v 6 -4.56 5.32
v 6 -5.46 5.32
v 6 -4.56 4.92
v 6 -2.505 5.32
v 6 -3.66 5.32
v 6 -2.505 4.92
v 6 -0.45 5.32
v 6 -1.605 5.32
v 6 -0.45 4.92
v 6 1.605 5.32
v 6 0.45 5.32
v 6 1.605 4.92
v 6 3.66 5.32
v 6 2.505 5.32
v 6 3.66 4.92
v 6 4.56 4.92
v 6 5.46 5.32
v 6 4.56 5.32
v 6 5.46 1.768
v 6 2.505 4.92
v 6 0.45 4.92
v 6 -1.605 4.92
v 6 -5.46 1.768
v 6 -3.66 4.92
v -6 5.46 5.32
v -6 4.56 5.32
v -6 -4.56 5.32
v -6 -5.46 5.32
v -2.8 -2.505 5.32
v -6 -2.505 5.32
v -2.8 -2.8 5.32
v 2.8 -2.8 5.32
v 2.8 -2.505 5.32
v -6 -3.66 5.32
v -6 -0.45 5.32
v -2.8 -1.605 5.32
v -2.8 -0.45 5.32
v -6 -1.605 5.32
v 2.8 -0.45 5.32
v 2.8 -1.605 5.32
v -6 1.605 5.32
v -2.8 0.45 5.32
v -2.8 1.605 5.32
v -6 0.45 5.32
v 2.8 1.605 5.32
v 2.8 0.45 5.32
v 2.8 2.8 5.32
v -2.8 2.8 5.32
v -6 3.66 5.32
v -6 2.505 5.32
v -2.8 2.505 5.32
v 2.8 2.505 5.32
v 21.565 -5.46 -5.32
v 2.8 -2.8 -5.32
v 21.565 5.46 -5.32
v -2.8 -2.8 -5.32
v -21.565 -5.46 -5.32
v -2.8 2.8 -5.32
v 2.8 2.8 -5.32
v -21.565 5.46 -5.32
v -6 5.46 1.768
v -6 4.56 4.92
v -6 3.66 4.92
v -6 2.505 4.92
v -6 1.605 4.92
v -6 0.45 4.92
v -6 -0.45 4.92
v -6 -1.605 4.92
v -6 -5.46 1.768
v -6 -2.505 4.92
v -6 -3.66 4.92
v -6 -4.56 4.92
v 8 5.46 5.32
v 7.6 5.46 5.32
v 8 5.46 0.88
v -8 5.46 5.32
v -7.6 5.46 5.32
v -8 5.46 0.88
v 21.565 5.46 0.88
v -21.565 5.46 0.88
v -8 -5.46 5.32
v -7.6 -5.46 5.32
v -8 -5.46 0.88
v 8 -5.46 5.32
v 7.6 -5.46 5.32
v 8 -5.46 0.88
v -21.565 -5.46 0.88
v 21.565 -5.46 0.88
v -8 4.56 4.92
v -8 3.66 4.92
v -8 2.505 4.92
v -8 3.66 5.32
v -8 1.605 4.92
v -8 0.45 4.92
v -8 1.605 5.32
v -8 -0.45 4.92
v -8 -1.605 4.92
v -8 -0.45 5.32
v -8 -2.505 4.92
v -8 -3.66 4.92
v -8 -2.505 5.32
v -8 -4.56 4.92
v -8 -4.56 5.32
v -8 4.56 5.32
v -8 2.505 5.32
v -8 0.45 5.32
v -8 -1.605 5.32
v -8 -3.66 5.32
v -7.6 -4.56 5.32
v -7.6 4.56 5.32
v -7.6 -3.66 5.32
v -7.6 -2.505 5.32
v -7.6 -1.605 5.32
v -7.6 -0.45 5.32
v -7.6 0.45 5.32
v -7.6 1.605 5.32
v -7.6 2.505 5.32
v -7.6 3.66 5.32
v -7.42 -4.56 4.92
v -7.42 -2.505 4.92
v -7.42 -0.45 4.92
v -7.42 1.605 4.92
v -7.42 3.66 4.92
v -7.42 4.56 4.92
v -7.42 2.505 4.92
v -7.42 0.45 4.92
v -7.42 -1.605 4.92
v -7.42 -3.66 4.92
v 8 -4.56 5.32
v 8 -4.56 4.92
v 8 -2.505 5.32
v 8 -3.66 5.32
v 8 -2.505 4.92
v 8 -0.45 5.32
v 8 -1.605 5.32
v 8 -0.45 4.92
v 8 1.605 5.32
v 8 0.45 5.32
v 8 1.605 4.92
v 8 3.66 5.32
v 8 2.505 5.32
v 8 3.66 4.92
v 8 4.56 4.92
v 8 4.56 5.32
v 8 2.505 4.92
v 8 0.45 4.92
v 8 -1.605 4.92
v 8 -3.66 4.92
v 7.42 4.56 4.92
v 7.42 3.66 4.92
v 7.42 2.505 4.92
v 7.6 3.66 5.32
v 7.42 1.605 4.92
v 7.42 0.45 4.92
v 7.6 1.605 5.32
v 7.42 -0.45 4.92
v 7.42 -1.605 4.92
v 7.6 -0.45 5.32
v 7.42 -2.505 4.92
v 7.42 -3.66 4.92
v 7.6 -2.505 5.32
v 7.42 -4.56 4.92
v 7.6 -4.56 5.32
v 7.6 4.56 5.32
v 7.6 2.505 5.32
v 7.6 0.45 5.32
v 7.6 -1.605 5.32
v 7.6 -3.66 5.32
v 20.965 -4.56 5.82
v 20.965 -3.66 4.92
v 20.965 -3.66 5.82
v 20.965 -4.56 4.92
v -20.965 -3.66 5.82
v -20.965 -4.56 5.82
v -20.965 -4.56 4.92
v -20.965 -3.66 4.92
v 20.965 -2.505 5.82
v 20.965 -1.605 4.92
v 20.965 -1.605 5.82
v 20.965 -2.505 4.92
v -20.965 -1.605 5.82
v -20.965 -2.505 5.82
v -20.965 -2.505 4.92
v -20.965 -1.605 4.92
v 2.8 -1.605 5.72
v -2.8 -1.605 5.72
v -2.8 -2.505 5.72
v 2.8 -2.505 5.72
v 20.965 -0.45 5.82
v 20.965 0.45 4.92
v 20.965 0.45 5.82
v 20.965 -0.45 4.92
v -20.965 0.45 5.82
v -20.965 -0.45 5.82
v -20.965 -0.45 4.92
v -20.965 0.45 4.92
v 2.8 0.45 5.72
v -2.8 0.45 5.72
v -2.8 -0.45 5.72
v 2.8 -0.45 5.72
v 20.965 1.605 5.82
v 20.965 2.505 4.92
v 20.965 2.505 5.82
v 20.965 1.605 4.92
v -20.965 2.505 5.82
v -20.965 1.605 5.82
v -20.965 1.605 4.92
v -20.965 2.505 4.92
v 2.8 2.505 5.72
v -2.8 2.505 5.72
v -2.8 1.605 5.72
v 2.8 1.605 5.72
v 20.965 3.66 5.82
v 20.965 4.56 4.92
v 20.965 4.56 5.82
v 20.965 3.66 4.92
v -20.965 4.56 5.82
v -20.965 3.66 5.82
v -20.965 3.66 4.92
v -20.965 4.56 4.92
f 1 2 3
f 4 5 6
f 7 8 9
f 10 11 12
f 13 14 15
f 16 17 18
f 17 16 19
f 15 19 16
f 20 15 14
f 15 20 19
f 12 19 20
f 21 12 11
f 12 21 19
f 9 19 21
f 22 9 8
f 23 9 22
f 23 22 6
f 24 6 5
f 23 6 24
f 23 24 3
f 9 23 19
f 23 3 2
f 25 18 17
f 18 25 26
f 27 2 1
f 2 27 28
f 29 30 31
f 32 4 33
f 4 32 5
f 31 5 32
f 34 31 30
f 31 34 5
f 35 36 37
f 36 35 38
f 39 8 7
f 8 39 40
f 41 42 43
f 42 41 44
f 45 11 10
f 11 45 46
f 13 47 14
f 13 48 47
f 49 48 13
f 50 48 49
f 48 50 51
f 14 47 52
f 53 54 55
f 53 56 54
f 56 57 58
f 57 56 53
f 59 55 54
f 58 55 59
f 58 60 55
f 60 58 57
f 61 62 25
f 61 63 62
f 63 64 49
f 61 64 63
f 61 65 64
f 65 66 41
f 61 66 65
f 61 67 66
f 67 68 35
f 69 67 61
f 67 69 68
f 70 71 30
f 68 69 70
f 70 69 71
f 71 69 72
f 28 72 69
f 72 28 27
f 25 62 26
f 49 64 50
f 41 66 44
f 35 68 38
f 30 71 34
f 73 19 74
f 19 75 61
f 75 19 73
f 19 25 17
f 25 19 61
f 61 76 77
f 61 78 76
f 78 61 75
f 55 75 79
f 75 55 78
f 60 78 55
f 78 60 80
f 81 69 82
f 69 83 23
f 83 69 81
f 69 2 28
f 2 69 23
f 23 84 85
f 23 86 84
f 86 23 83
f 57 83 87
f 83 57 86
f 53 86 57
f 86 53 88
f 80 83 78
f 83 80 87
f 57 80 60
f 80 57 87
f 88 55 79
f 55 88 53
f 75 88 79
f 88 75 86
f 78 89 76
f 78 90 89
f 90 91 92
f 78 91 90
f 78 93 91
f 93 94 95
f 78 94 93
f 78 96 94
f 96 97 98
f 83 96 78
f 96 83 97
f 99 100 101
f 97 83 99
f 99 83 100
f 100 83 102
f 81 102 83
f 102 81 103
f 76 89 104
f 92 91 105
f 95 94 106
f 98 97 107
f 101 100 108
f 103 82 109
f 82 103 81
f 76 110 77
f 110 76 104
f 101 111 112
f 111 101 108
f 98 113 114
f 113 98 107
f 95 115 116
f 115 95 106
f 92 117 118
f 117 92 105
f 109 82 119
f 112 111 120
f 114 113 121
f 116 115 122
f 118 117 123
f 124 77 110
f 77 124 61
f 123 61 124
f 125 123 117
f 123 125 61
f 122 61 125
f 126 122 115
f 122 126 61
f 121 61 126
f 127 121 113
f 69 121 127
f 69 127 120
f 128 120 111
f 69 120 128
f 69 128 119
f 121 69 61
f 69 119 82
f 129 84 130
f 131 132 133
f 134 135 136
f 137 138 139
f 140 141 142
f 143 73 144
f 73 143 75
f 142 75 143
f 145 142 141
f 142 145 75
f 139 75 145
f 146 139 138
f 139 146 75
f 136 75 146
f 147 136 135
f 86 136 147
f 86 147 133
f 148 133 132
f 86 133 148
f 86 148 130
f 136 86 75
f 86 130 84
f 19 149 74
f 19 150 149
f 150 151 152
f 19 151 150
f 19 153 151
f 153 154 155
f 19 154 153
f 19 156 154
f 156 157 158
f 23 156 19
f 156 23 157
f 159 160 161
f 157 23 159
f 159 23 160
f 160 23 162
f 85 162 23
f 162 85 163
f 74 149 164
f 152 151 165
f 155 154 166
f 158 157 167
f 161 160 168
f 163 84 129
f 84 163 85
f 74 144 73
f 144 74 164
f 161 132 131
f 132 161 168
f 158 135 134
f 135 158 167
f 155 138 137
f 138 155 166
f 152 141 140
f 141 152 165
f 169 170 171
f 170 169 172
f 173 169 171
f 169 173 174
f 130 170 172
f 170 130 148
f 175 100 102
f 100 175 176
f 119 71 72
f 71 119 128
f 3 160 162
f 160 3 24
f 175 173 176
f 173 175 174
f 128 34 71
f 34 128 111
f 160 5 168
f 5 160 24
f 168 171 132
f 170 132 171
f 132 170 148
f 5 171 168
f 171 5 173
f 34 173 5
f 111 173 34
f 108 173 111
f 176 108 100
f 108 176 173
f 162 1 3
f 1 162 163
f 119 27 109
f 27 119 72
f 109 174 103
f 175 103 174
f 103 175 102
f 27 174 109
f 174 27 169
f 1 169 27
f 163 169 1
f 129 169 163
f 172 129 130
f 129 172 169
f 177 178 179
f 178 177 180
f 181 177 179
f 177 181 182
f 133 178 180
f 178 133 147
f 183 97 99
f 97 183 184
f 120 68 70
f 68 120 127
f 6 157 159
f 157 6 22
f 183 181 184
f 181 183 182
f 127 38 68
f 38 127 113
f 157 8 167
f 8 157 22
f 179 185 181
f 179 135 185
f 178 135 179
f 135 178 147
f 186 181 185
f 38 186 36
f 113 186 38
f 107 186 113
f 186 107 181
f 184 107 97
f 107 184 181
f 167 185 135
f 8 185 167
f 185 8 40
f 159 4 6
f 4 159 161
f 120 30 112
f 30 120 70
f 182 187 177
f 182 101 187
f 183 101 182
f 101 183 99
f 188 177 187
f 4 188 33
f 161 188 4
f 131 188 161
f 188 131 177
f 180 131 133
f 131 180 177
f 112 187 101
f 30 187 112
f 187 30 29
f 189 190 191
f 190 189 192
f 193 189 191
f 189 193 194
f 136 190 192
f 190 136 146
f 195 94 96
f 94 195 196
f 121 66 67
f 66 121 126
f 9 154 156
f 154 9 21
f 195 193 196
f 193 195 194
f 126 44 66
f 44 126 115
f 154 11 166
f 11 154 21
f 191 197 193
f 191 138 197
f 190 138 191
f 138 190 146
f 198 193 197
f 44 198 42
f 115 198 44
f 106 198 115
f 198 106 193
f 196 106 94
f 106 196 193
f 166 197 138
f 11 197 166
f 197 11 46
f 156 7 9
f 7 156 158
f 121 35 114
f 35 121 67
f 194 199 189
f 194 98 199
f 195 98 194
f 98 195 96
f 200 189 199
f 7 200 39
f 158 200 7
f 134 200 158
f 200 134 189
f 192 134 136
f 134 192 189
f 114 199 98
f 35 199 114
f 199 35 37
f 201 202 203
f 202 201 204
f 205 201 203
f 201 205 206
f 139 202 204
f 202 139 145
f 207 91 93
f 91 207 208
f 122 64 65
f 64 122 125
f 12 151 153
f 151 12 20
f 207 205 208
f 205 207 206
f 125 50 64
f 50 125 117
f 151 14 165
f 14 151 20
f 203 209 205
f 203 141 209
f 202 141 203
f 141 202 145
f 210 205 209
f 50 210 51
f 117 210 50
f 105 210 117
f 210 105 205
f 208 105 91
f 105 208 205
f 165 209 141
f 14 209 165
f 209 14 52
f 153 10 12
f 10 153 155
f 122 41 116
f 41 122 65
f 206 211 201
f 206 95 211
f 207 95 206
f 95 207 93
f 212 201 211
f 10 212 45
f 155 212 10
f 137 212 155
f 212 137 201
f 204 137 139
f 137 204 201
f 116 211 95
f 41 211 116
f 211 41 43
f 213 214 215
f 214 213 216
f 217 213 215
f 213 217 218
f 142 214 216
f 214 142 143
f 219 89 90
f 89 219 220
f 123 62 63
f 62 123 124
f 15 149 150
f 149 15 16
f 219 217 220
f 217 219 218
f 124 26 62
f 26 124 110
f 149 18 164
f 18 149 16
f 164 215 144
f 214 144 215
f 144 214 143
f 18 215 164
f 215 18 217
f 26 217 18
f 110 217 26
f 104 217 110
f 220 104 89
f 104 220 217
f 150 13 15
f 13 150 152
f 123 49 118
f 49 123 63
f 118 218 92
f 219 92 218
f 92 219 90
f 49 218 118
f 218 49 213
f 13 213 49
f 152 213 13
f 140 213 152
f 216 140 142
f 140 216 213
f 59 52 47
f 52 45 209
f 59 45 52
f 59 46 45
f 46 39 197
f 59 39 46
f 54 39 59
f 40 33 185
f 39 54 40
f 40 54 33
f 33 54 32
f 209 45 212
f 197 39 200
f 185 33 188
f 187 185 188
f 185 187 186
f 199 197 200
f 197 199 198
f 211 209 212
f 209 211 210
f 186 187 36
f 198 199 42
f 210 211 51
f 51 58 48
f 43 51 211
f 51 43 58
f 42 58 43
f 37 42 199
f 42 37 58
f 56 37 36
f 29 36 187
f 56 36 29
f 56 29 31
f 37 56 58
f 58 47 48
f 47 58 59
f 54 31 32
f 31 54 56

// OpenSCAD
// Symmetric elongated bracket/strap with central square through-window and longitudinal ribs
// Target bounding box: 10.9 x 43.9 x 10.6 mm (W x L x H), elongated along X

$fn = 64;

// Overall dimensions
L = 43.93;   // X
W = 10.92;   // Y
H = 10.64;   // Z

// Central block
center_L = 12.0;
center_W = W;
center_H = H;

// Arms (thinner)
arm_L_each = (L - center_L)/2;
arm_W = W;
arm_H = 6.2;

// Transition length (simple hull ramp)
transition_L = 2.0;

// Square through-window (through full height)
window_size = 5.6;

// Ribs: multiple longitudinal ribs on ONE face (top)
rib_count = 5;
rib_W = 0.9;     // rib width across Y
rib_H = 0.9;     // rib height in Z
rib_end_margin = 1.0;
rib_side_margin = 0.9;

// Small overlap to guarantee manifold unions/differences
overlap = 0.4;

// ----------------- Core solids -----------------
module central_block() {
    cube([center_L, center_W, center_H], center=true);
}

module arm(side=1) { // side = -1 left, +1 right
    // Place arm so it overlaps into central block by 'overlap'
    translate([side*(center_L/2 + arm_L_each/2 - overlap), 0, -(center_H/2 - arm_H/2)])
        cube([arm_L_each, arm_W, arm_H], center=true);
}

module transition(side=1) {
    // Hull between a thin slice at arm height and a thin slice at full height
    hull() {
        // slice at arm height, right at the central edge
        translate([side*(center_L/2 - overlap/2), 0, -(center_H/2 - arm_H/2)])
            cube([overlap, arm_W, arm_H], center=true);

        // slice at full height, a bit into the arm
        translate([side*(center_L/2 + transition_L - overlap/2), 0, 0])
            cube([overlap, center_W, center_H], center=true);
    }
}

module square_through_window() {
    cube([window_size, window_size, center_H + 2*overlap], center=true);
}

// Longitudinal ribs on TOP face, spanning most of length
module ribs_top() {
    rib_span_L = L - 2*rib_end_margin;
    y_min = -W/2 + rib_side_margin + rib_W/2;
    y_max =  W/2 - rib_side_margin - rib_W/2;

    for (i = [0 : rib_count-1]) {
        t = (rib_count <= 1) ? 0.5 : i/(rib_count-1);
        y = y_min + t*(y_max - y_min);

        // Ensure ribs are actually visible: sit on top face with slight overlap into body
        translate([0, y, H/2 + rib_H/2 - overlap])
            cube([rib_span_L, rib_W, rib_H], center=true);
    }
}

// ----------------- Final model -----------------
module model() {
    difference() {
        union() {
            // Main connected body
            union() {
                central_block();
                arm(-1);
                arm( 1);
                transition(-1);
                transition( 1);
            }
            // Ribs on one face
            ribs_top();
        }

        // Central square through-window
        square_through_window();
    }
}

model();
